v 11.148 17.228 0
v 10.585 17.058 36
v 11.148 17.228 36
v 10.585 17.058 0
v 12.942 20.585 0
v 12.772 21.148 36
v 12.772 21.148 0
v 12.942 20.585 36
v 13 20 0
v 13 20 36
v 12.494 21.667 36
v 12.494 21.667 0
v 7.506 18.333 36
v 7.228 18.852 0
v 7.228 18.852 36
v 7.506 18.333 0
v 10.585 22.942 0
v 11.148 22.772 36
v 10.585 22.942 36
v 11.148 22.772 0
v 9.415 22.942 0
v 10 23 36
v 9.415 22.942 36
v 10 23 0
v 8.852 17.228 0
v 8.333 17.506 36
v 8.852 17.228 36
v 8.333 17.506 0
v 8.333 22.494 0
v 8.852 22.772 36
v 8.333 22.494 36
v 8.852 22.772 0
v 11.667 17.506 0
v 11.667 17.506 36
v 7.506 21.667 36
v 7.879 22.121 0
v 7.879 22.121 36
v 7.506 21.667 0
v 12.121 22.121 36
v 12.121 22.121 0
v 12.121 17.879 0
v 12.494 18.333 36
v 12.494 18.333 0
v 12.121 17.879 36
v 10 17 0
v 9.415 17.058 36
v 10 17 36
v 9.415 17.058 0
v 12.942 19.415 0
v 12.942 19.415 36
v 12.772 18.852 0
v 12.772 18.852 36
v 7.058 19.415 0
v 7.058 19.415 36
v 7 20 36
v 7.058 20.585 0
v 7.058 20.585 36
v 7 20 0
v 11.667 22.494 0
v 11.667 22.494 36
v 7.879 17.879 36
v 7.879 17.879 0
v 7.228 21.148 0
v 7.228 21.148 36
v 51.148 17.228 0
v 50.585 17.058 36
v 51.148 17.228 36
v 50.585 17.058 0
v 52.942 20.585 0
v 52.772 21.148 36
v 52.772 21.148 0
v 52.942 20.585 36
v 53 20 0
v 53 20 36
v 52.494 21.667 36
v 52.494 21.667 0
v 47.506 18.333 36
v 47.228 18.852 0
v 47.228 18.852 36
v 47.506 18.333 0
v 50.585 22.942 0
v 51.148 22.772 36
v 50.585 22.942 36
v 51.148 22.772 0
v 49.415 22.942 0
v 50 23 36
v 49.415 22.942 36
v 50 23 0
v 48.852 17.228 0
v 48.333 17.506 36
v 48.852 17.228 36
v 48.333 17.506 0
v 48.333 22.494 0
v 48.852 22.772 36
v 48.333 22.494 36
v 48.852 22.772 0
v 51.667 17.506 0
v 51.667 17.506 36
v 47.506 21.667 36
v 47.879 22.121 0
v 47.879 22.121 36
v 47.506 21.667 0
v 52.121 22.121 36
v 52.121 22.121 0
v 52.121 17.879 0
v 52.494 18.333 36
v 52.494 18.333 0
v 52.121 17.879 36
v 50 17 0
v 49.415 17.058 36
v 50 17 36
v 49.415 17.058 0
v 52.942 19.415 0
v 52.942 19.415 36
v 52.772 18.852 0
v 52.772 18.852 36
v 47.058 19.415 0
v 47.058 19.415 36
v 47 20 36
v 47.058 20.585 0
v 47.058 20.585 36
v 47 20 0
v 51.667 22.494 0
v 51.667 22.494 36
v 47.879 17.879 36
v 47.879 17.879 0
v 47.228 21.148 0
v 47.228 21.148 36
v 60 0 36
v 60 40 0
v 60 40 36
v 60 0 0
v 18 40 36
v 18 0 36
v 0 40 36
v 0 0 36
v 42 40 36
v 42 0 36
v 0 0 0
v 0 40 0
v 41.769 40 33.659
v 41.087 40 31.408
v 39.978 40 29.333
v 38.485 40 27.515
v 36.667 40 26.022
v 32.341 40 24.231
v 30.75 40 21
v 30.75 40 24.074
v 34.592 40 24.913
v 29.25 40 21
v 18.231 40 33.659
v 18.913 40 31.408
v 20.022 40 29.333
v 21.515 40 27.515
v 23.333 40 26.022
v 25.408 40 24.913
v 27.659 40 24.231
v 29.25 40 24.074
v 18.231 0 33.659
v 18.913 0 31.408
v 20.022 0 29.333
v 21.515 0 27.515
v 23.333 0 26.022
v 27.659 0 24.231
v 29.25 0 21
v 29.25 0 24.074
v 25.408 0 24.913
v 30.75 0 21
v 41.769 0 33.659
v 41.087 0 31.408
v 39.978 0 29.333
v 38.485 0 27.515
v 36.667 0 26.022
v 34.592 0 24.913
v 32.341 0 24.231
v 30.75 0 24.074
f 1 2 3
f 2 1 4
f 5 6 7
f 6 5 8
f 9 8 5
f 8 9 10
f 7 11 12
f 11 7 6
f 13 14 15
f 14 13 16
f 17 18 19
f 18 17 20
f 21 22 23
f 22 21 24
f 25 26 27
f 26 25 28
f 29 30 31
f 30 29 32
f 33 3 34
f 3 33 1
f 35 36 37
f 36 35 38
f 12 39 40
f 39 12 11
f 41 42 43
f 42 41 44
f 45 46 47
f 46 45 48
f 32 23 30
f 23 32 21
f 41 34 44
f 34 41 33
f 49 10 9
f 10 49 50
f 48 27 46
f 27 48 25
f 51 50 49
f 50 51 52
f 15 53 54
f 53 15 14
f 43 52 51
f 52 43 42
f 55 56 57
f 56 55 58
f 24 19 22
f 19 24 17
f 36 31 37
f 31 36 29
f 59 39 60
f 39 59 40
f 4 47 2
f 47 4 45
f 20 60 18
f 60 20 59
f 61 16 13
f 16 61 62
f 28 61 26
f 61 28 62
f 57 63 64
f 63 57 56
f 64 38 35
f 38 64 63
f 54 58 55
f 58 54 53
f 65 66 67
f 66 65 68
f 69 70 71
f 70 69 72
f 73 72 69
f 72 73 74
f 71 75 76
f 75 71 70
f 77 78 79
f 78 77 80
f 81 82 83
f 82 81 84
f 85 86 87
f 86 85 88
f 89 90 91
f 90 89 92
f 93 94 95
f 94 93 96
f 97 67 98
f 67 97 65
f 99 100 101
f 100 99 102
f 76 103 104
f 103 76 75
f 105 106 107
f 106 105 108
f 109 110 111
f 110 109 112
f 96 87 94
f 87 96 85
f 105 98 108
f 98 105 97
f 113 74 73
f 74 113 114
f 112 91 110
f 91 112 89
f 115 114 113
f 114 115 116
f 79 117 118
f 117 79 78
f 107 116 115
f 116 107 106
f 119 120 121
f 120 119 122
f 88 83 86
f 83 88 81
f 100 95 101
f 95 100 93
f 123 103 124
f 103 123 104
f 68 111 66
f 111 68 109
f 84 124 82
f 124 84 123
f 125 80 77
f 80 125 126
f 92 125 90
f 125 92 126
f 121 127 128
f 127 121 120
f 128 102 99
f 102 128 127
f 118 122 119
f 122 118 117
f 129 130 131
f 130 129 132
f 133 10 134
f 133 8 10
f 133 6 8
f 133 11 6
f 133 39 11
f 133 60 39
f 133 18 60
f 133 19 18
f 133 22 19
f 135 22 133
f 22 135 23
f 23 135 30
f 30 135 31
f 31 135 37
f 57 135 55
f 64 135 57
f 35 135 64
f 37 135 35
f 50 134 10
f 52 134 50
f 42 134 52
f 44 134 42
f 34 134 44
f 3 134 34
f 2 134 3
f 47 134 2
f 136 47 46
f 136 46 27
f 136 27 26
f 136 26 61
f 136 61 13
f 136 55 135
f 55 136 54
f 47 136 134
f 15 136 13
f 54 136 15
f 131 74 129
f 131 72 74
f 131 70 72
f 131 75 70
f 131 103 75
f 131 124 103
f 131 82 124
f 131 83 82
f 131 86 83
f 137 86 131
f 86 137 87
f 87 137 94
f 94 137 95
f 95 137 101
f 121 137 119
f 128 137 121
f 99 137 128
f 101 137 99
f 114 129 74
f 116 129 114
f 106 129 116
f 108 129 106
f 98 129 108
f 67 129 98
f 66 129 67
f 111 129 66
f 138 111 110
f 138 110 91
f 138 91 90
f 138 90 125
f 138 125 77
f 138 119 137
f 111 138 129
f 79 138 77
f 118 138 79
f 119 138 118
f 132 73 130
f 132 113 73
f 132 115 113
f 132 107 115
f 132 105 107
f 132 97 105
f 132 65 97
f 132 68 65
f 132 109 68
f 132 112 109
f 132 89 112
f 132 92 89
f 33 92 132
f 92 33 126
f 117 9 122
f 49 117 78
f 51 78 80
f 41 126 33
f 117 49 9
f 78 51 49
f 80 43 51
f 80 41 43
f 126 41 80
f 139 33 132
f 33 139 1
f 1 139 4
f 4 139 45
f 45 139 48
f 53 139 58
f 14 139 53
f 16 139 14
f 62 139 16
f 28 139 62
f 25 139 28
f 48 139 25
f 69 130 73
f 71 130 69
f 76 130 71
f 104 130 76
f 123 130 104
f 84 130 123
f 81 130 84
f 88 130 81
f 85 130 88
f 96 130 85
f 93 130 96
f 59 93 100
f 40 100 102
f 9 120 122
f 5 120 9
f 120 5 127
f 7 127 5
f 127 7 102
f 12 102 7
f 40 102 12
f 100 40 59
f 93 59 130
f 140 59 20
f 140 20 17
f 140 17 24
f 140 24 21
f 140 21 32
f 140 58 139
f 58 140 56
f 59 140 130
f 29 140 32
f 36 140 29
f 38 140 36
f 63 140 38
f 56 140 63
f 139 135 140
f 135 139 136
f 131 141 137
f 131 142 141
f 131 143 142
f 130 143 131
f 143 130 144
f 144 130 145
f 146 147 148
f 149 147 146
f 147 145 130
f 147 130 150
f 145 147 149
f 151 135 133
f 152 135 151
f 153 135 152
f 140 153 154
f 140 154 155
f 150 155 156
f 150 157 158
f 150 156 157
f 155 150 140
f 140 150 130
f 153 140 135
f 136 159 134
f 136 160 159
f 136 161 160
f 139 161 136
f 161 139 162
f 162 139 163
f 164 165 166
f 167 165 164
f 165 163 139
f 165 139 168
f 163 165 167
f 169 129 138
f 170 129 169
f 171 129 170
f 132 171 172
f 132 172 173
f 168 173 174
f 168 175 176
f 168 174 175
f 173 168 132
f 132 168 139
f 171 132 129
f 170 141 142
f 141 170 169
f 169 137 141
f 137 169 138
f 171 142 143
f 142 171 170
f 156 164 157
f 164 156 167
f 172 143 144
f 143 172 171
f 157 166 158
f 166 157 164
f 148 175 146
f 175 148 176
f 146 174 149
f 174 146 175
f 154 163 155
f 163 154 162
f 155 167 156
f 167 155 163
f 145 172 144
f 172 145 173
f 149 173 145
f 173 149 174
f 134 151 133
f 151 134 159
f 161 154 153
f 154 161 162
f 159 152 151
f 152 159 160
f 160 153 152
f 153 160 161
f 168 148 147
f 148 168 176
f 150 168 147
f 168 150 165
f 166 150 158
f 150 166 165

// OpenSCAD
$fn = 32;

// ----------------------------------------------------------------------
// Saddle clamp: split shaft clamp
// ----------------------------------------------------------------------

// --- parameters (mm) ---
blk_l = 60;               // block length, X
blk_w = 40;               // block width, Y
blk_h = 36;               // block height
clamp_r = 12;             // shaft groove radius
hole_r = 3;               // bolt hole radius
hole_m = 10;              // bolt hole margin from the ends
saw_w = 1.5;              // saw kerf width

saw_depth = clamp_r + 3;  // saw kerf depth

difference() {
  cube([blk_l, blk_w, blk_h]);
  translate([blk_l / 2, -1, blk_h])
    rotate([-90, 0, 0])
      cylinder(h = blk_w + 2, r = clamp_r);
  for (sx = [0, 1])
    translate([sx ? blk_l - hole_m : hole_m, blk_w / 2, -1])
      cylinder(r = hole_r, h = blk_h + 2);
  translate([blk_l / 2 - saw_w / 2, -1, blk_h - saw_depth])
    cube([saw_w, blk_w + 2, saw_depth + 1]);
}
